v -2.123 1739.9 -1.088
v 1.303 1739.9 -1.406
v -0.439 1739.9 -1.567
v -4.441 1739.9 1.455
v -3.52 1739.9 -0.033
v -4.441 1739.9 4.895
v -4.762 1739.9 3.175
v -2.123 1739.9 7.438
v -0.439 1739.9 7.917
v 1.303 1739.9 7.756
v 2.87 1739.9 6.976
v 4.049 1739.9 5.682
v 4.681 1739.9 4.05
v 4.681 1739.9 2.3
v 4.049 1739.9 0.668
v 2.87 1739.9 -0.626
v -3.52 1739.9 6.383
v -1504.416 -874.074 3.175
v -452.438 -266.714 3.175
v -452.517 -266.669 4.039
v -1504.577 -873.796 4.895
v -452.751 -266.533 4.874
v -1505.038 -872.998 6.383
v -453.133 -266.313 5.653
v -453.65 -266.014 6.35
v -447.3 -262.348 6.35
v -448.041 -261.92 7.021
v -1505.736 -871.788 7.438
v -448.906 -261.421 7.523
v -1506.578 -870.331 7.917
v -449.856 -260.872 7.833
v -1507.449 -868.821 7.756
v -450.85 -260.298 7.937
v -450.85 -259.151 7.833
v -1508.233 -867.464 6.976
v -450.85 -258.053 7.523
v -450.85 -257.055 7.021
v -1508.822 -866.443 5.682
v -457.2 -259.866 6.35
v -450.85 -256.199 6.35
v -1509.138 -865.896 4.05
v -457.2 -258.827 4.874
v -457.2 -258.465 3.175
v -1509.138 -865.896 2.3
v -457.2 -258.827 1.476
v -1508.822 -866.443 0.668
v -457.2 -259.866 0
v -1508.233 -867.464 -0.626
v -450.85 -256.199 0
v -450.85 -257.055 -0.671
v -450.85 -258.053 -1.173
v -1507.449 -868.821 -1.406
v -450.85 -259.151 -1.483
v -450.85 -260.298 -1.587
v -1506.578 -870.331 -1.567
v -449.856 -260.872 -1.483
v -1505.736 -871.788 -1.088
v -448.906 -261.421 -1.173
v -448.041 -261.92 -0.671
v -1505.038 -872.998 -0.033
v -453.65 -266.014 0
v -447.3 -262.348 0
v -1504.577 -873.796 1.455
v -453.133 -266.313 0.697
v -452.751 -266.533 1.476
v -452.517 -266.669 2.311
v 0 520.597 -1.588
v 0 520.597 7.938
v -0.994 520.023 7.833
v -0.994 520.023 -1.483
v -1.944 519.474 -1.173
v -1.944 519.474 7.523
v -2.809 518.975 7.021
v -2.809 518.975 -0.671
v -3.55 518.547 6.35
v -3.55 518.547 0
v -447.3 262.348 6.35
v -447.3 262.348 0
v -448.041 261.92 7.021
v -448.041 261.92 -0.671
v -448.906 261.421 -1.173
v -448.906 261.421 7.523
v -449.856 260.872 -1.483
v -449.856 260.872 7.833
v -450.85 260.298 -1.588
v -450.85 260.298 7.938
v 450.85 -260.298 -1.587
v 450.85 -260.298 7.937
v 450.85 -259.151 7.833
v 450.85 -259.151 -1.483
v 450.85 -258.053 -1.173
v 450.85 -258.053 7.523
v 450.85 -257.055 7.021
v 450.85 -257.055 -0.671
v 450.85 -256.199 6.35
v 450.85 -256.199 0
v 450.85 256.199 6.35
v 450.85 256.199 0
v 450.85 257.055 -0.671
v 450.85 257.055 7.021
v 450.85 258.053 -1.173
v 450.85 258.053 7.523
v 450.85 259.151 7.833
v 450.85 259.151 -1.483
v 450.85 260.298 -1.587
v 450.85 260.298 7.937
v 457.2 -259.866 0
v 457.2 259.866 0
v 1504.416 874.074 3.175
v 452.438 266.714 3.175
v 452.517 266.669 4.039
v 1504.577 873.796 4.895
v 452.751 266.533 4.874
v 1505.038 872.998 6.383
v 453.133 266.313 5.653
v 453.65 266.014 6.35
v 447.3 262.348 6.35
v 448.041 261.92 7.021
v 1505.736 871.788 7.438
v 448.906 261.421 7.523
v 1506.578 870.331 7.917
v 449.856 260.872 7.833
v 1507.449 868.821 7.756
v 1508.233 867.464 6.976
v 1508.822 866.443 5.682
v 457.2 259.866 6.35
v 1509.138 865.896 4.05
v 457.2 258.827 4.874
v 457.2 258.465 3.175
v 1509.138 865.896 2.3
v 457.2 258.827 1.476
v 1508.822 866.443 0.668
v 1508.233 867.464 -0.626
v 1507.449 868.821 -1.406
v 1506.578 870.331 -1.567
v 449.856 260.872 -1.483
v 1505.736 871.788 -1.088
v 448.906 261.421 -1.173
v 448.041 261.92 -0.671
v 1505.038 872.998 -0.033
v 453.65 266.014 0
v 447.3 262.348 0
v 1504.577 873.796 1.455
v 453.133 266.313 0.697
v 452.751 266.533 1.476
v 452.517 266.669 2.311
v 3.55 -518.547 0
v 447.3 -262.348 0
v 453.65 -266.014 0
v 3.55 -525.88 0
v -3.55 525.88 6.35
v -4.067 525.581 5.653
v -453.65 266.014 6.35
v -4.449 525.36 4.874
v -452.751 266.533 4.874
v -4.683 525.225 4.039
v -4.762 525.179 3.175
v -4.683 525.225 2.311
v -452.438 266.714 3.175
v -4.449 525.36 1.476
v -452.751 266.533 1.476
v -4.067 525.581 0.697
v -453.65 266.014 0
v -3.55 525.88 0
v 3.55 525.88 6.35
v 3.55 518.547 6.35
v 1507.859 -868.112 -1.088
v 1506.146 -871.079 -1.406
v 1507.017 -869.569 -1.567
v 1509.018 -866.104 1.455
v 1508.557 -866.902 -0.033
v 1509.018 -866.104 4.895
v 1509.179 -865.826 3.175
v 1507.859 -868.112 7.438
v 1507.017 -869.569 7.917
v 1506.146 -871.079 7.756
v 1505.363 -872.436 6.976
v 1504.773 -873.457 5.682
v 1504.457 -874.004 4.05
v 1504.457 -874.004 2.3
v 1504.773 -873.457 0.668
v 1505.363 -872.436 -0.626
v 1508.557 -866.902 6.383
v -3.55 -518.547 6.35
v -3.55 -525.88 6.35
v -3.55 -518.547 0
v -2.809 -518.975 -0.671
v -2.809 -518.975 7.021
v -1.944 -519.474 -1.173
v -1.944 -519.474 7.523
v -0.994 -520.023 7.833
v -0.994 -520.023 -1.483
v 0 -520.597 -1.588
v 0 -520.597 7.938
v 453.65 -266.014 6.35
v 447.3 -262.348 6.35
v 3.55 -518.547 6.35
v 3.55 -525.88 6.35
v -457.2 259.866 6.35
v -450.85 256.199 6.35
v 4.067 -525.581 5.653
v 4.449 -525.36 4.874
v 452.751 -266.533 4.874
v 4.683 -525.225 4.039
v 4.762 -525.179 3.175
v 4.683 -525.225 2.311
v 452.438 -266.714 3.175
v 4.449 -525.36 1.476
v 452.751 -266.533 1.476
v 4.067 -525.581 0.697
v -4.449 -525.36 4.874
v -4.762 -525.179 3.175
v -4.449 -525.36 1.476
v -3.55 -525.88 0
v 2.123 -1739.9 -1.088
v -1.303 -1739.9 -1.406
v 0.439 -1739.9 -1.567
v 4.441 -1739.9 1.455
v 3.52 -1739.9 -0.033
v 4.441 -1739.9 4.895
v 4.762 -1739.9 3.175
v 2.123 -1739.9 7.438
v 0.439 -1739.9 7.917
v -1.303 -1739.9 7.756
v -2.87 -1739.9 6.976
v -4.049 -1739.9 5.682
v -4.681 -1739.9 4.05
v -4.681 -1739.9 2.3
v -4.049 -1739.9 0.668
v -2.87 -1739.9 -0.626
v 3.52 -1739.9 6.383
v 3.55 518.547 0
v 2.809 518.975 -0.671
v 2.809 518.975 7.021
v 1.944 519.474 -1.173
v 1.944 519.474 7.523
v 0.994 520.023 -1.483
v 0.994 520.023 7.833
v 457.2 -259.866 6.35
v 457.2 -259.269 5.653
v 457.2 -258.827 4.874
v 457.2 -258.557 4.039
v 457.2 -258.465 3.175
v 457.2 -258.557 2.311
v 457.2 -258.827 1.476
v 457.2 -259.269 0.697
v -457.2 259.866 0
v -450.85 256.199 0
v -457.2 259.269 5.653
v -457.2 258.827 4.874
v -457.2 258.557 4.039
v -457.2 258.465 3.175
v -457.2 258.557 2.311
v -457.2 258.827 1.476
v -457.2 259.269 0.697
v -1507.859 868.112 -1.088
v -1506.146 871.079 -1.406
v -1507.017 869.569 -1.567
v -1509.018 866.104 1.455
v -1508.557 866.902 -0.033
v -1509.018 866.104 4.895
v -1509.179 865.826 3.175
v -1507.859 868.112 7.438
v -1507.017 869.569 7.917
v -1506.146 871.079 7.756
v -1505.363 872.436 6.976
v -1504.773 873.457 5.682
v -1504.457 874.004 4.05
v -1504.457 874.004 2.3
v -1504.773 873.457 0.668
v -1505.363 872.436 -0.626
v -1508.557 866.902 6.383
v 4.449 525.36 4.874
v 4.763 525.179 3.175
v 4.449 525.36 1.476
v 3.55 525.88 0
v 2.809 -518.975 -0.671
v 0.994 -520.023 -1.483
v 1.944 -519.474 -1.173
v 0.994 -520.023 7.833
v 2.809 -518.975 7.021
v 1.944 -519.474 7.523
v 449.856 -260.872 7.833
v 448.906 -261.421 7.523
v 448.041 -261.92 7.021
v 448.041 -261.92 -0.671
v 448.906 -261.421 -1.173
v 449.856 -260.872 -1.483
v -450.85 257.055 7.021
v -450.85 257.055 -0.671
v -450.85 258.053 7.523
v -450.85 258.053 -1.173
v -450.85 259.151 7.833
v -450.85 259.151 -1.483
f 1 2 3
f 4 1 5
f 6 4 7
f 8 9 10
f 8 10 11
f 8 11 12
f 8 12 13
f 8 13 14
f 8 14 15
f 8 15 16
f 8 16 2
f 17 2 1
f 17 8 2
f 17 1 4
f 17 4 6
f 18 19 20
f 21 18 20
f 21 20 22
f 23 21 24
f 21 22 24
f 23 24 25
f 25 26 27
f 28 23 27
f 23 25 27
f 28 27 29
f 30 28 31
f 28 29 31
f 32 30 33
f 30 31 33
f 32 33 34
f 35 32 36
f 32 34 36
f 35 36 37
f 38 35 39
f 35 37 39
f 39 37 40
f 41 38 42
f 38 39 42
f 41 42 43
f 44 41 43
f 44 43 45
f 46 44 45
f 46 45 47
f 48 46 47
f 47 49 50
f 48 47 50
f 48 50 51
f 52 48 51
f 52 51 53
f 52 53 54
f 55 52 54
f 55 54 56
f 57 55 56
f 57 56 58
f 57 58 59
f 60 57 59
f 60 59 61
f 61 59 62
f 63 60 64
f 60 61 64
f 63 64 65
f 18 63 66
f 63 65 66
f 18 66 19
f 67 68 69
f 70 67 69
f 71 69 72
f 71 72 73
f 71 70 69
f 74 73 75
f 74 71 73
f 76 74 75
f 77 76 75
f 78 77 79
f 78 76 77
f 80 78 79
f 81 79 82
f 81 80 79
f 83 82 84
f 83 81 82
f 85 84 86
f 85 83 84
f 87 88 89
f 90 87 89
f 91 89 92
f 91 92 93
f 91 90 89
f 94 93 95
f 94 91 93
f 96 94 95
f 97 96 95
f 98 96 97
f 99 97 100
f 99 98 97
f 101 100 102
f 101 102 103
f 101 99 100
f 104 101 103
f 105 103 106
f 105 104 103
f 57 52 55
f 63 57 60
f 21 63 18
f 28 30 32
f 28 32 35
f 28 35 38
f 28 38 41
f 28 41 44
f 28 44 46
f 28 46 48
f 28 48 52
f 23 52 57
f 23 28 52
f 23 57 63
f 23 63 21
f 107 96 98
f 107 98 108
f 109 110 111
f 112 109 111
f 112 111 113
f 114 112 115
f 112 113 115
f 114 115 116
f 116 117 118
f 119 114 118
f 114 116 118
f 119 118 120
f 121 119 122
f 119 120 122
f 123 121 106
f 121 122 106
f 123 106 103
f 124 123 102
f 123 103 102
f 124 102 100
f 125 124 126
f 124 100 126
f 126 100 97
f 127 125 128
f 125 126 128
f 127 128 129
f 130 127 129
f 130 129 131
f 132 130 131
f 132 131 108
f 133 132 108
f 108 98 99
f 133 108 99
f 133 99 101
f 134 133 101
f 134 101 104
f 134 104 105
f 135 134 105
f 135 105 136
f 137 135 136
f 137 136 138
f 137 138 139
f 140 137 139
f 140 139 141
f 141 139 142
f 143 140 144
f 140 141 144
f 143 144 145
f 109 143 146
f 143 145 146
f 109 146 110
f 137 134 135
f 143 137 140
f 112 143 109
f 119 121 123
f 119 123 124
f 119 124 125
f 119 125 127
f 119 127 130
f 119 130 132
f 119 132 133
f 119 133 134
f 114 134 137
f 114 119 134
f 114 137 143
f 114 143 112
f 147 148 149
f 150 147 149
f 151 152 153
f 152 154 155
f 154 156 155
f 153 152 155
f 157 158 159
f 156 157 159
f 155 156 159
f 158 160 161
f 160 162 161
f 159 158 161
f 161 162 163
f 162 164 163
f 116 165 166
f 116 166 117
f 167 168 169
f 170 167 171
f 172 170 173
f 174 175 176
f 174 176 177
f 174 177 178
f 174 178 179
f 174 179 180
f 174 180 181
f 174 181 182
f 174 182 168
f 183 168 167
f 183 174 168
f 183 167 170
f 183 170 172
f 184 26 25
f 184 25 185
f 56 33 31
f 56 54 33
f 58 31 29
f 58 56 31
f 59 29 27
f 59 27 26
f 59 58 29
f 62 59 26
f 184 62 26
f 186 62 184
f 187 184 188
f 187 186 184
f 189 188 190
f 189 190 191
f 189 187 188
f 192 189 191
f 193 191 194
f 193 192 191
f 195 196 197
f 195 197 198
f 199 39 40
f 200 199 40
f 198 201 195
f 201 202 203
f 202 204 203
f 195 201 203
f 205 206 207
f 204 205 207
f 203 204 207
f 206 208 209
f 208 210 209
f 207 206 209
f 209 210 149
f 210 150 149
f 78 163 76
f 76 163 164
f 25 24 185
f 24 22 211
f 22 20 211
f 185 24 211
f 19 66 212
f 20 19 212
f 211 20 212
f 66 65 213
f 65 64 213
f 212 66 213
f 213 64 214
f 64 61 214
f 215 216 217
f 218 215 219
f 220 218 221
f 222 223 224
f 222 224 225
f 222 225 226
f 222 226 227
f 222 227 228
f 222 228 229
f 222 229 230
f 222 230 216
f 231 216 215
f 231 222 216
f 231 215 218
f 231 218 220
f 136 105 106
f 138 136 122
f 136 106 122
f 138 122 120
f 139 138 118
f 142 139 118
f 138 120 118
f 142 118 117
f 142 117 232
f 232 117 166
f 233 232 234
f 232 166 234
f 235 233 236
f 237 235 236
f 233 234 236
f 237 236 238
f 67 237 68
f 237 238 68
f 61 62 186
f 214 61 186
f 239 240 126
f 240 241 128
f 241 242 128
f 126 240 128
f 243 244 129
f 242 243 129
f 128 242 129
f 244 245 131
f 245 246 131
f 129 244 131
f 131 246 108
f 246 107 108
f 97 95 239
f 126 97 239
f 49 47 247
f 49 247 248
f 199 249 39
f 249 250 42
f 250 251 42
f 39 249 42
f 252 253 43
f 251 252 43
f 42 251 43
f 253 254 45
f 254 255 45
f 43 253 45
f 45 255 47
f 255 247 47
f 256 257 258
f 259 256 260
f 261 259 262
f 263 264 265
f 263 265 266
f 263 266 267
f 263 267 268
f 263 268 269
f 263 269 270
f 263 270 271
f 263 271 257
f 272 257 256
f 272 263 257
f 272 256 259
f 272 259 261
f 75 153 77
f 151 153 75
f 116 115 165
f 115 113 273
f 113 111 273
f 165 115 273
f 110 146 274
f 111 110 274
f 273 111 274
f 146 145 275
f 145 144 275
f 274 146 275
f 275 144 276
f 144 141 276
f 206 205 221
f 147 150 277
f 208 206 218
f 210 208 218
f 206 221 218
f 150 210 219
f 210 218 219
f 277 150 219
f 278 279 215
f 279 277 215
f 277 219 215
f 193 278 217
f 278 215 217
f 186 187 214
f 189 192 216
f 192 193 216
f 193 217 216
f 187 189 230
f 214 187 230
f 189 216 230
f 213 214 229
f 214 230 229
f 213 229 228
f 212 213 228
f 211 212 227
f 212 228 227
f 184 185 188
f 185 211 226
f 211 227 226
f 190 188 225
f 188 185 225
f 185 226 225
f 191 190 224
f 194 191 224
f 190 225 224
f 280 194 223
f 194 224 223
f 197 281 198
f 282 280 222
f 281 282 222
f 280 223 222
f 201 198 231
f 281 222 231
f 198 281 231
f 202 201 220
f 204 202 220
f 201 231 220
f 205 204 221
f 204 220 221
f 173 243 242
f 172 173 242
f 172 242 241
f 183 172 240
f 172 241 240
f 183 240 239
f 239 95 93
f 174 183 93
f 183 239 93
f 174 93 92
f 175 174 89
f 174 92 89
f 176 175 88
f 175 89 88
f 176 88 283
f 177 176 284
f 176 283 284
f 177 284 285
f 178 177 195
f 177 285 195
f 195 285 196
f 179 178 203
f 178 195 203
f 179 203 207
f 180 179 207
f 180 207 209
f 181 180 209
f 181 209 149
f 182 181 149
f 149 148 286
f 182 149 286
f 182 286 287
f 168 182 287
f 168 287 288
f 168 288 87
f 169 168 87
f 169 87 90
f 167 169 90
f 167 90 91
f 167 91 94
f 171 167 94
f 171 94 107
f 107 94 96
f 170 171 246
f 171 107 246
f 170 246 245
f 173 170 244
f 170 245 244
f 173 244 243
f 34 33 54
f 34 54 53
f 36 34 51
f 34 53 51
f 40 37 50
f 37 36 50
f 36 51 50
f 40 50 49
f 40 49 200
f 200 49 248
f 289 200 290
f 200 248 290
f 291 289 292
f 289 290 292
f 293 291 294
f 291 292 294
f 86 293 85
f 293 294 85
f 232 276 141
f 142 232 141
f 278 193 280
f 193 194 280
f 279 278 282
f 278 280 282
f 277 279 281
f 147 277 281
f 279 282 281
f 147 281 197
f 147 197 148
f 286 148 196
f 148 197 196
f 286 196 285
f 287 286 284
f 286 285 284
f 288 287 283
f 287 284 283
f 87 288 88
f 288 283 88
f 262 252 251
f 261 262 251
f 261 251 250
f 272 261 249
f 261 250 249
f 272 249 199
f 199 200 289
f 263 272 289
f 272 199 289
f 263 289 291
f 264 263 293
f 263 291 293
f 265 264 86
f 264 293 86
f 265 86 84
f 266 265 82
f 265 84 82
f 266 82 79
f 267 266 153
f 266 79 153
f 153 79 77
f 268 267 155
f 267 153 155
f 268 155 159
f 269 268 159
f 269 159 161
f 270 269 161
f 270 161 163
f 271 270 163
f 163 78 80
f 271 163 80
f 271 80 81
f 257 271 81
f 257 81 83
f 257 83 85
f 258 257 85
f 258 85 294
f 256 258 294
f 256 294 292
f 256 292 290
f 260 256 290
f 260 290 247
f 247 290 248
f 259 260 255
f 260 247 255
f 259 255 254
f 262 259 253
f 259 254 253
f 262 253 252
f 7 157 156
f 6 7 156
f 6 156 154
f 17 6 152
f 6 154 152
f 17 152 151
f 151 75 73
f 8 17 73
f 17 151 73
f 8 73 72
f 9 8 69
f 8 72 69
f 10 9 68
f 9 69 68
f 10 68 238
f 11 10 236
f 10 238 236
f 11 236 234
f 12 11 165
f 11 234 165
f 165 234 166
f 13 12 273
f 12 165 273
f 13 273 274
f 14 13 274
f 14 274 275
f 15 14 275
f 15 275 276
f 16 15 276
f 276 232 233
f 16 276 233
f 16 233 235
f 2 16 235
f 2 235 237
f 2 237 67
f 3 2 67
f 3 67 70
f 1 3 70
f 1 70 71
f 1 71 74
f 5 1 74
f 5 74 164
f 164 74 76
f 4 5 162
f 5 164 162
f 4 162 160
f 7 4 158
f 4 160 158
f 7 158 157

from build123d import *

# Parameters (mm, degrees)
F1_DEPTH      = 6.35
F2_R          = 4.7625
F3_DEPTH      = 1739.9
F5_COUNT      = 6
F7_DEPTH      = 25.4
F7_DEPTH_BACK = 25.4


with BuildPart() as f1:
    # F0 (on Top) → F1 (new body)
    with BuildSketch(Plane.XY):
        Polygon((457.2, 263.9645430735), (0, 527.929086147), (-457.2, 263.9645430735), (-457.2, -263.9645430735), (0, -527.929086147), (457.2, -263.9645430735), align=None)
        Polygon((-450.85, 260.2983688641), (0, 520.5967377283), (450.85, 260.2983688641), (450.85, -260.2983688641), (0, -520.5967377283), (-450.85, -260.2983688641), align=None, mode=Mode.SUBTRACT)
    extrude(amount=F1_DEPTH)

    # F2 (on Front) → F3 (join)
    with BuildSketch(Plane.XZ):
        with Locations((0, 3.175)):
            Circle(F2_R)
    extrude(amount=F3_DEPTH)

    # F5: F1 ×6 about axis
    f5_axis = Axis((0, 0, 11.23058144), (0, 0, 1))


with BuildPart() as f1_1:
    add(f1.part)
    for i in range(1, F5_COUNT):
        add(f1.part.rotate(f5_axis, i * 360 / F5_COUNT))

    # F6 (on Top) → F7 (cut, two sides)
    with BuildSketch(Plane.XY) as f7_sk:
        Polygon((450.85, -260.2983688641), (450.85, 260.2983688641), (0, 520.5967377283), (-450.85, 260.2983688641), (-450.85, -260.2983688641), (0, -520.5967377283), align=None)
    extrude(amount=-F7_DEPTH, mode=Mode.SUBTRACT)
    extrude(f7_sk.sketch, amount=F7_DEPTH_BACK, mode=Mode.SUBTRACT)


solid = f1_1.part
